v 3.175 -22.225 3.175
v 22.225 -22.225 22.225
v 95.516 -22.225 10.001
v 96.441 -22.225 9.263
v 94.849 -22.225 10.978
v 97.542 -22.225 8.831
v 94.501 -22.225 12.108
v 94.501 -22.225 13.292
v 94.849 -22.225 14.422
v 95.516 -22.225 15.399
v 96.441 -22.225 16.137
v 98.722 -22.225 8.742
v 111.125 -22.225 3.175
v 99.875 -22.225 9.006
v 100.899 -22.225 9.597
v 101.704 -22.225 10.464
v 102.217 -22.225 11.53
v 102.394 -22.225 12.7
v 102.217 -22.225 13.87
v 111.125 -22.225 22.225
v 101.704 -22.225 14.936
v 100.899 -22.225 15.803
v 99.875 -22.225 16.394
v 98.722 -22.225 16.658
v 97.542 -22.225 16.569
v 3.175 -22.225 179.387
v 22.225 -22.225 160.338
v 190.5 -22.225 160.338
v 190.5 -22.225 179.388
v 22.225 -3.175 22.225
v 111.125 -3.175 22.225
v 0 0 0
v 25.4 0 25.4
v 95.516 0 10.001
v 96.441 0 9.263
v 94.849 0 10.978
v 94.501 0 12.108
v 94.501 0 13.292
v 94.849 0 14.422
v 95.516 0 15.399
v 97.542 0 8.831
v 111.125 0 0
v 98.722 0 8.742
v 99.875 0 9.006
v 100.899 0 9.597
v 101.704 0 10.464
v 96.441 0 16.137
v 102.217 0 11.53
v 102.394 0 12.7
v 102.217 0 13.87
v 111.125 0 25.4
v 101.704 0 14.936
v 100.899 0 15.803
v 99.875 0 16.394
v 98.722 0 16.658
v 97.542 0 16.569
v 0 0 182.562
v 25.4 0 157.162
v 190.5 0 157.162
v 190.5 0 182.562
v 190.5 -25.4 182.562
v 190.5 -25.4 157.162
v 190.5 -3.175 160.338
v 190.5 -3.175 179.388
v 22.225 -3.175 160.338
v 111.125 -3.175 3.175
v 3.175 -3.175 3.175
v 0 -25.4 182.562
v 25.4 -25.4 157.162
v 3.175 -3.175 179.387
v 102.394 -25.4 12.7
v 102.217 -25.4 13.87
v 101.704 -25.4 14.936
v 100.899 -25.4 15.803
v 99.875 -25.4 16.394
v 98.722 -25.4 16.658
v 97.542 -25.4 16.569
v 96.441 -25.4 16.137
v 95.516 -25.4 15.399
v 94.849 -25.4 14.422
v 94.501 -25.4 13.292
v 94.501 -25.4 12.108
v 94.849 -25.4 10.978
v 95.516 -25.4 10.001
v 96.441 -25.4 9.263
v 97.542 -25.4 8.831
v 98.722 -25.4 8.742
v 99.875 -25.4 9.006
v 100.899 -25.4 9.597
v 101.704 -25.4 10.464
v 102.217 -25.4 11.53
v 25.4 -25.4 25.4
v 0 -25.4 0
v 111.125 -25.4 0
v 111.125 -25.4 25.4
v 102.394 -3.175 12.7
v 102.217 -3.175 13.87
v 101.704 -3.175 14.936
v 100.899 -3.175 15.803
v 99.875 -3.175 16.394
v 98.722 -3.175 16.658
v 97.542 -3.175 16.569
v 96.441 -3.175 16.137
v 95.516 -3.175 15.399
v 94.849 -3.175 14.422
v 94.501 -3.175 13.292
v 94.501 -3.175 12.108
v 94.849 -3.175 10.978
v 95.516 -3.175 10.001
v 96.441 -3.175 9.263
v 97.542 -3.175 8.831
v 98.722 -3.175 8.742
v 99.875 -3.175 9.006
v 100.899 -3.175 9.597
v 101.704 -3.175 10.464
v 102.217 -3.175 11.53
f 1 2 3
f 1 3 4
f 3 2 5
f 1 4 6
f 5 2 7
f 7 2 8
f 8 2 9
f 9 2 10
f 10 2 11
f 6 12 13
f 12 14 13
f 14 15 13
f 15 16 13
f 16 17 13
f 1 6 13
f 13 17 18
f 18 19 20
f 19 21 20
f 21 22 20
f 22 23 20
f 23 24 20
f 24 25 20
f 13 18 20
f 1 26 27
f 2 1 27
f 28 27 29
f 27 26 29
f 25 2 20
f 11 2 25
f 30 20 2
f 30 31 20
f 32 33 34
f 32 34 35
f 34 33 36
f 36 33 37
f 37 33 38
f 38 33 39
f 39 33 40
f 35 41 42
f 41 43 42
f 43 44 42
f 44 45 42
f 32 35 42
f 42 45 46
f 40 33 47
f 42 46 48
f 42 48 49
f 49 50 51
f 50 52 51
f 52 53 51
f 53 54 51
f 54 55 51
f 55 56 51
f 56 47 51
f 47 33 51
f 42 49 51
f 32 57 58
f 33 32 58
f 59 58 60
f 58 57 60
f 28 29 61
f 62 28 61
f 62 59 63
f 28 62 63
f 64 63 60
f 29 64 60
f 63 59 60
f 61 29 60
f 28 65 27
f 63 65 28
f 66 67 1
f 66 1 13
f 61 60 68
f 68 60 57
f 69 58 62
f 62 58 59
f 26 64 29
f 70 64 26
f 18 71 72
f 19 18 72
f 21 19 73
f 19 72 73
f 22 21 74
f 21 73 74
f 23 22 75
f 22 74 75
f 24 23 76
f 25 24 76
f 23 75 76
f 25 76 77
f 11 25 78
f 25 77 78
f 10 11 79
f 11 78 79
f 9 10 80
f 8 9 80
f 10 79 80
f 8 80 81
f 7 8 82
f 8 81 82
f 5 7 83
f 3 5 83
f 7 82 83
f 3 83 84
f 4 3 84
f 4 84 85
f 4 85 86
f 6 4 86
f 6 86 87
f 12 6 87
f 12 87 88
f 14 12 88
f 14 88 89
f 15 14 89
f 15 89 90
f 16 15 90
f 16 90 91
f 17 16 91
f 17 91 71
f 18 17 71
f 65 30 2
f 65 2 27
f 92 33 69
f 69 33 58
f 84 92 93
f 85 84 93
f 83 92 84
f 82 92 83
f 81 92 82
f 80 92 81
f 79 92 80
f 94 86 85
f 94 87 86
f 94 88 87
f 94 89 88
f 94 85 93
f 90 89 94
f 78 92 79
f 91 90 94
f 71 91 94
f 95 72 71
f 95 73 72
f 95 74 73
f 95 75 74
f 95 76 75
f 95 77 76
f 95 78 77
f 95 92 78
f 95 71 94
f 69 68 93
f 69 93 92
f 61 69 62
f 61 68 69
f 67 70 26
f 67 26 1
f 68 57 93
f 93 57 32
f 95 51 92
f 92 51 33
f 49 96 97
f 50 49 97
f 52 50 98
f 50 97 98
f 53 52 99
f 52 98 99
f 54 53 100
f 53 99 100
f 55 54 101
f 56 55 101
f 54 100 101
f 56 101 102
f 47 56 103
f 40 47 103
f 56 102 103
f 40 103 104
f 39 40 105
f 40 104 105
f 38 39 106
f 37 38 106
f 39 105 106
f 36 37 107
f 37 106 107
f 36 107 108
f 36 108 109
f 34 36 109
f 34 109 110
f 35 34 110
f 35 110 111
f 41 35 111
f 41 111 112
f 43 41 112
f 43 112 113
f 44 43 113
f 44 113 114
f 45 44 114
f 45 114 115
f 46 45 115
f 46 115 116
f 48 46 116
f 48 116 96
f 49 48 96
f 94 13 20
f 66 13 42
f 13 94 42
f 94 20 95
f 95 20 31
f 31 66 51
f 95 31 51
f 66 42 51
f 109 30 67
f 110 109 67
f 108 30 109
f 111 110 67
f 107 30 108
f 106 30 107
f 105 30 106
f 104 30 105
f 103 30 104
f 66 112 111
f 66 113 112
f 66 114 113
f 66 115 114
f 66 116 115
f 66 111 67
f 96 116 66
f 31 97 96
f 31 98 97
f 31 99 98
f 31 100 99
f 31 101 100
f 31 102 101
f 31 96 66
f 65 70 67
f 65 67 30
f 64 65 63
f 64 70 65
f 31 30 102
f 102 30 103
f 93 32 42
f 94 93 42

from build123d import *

# Parameters (mm, degrees)
F1_DEPTH = 25.4
F2_T     = -3.175
F3_R     = 3.96875
F4_DEPTH = 25.4


with BuildPart() as f1:
    # F0 (on Front) → F1 (new body)
    with BuildSketch(Plane.XZ):
        Polygon((0, 182.5625), (0, 0), (111.125, 0), (111.125, 25.4), (25.4, 25.4), (25.4, 157.1625), (190.5, 157.1625), (190.5, 182.5625), align=None)
    extrude(amount=F1_DEPTH)

    # F2
    f2_openings = [f1.faces().sort_by_distance(p)[0] for p in [
        (190.5, -12.7, 169.8625),
        (111.125, -12.7, 12.7),
    ]]
    offset(amount=F2_T, openings=f2_openings, kind=Kind.INTERSECTION)

    # F3 (on face) → F4 (cut)
    with BuildSketch(Plane.XZ.offset(25.4)):
        with Locations((98.425, 12.7)):
            Circle(F3_R)
    extrude(amount=-F4_DEPTH, mode=Mode.SUBTRACT)


solid = f1.part
